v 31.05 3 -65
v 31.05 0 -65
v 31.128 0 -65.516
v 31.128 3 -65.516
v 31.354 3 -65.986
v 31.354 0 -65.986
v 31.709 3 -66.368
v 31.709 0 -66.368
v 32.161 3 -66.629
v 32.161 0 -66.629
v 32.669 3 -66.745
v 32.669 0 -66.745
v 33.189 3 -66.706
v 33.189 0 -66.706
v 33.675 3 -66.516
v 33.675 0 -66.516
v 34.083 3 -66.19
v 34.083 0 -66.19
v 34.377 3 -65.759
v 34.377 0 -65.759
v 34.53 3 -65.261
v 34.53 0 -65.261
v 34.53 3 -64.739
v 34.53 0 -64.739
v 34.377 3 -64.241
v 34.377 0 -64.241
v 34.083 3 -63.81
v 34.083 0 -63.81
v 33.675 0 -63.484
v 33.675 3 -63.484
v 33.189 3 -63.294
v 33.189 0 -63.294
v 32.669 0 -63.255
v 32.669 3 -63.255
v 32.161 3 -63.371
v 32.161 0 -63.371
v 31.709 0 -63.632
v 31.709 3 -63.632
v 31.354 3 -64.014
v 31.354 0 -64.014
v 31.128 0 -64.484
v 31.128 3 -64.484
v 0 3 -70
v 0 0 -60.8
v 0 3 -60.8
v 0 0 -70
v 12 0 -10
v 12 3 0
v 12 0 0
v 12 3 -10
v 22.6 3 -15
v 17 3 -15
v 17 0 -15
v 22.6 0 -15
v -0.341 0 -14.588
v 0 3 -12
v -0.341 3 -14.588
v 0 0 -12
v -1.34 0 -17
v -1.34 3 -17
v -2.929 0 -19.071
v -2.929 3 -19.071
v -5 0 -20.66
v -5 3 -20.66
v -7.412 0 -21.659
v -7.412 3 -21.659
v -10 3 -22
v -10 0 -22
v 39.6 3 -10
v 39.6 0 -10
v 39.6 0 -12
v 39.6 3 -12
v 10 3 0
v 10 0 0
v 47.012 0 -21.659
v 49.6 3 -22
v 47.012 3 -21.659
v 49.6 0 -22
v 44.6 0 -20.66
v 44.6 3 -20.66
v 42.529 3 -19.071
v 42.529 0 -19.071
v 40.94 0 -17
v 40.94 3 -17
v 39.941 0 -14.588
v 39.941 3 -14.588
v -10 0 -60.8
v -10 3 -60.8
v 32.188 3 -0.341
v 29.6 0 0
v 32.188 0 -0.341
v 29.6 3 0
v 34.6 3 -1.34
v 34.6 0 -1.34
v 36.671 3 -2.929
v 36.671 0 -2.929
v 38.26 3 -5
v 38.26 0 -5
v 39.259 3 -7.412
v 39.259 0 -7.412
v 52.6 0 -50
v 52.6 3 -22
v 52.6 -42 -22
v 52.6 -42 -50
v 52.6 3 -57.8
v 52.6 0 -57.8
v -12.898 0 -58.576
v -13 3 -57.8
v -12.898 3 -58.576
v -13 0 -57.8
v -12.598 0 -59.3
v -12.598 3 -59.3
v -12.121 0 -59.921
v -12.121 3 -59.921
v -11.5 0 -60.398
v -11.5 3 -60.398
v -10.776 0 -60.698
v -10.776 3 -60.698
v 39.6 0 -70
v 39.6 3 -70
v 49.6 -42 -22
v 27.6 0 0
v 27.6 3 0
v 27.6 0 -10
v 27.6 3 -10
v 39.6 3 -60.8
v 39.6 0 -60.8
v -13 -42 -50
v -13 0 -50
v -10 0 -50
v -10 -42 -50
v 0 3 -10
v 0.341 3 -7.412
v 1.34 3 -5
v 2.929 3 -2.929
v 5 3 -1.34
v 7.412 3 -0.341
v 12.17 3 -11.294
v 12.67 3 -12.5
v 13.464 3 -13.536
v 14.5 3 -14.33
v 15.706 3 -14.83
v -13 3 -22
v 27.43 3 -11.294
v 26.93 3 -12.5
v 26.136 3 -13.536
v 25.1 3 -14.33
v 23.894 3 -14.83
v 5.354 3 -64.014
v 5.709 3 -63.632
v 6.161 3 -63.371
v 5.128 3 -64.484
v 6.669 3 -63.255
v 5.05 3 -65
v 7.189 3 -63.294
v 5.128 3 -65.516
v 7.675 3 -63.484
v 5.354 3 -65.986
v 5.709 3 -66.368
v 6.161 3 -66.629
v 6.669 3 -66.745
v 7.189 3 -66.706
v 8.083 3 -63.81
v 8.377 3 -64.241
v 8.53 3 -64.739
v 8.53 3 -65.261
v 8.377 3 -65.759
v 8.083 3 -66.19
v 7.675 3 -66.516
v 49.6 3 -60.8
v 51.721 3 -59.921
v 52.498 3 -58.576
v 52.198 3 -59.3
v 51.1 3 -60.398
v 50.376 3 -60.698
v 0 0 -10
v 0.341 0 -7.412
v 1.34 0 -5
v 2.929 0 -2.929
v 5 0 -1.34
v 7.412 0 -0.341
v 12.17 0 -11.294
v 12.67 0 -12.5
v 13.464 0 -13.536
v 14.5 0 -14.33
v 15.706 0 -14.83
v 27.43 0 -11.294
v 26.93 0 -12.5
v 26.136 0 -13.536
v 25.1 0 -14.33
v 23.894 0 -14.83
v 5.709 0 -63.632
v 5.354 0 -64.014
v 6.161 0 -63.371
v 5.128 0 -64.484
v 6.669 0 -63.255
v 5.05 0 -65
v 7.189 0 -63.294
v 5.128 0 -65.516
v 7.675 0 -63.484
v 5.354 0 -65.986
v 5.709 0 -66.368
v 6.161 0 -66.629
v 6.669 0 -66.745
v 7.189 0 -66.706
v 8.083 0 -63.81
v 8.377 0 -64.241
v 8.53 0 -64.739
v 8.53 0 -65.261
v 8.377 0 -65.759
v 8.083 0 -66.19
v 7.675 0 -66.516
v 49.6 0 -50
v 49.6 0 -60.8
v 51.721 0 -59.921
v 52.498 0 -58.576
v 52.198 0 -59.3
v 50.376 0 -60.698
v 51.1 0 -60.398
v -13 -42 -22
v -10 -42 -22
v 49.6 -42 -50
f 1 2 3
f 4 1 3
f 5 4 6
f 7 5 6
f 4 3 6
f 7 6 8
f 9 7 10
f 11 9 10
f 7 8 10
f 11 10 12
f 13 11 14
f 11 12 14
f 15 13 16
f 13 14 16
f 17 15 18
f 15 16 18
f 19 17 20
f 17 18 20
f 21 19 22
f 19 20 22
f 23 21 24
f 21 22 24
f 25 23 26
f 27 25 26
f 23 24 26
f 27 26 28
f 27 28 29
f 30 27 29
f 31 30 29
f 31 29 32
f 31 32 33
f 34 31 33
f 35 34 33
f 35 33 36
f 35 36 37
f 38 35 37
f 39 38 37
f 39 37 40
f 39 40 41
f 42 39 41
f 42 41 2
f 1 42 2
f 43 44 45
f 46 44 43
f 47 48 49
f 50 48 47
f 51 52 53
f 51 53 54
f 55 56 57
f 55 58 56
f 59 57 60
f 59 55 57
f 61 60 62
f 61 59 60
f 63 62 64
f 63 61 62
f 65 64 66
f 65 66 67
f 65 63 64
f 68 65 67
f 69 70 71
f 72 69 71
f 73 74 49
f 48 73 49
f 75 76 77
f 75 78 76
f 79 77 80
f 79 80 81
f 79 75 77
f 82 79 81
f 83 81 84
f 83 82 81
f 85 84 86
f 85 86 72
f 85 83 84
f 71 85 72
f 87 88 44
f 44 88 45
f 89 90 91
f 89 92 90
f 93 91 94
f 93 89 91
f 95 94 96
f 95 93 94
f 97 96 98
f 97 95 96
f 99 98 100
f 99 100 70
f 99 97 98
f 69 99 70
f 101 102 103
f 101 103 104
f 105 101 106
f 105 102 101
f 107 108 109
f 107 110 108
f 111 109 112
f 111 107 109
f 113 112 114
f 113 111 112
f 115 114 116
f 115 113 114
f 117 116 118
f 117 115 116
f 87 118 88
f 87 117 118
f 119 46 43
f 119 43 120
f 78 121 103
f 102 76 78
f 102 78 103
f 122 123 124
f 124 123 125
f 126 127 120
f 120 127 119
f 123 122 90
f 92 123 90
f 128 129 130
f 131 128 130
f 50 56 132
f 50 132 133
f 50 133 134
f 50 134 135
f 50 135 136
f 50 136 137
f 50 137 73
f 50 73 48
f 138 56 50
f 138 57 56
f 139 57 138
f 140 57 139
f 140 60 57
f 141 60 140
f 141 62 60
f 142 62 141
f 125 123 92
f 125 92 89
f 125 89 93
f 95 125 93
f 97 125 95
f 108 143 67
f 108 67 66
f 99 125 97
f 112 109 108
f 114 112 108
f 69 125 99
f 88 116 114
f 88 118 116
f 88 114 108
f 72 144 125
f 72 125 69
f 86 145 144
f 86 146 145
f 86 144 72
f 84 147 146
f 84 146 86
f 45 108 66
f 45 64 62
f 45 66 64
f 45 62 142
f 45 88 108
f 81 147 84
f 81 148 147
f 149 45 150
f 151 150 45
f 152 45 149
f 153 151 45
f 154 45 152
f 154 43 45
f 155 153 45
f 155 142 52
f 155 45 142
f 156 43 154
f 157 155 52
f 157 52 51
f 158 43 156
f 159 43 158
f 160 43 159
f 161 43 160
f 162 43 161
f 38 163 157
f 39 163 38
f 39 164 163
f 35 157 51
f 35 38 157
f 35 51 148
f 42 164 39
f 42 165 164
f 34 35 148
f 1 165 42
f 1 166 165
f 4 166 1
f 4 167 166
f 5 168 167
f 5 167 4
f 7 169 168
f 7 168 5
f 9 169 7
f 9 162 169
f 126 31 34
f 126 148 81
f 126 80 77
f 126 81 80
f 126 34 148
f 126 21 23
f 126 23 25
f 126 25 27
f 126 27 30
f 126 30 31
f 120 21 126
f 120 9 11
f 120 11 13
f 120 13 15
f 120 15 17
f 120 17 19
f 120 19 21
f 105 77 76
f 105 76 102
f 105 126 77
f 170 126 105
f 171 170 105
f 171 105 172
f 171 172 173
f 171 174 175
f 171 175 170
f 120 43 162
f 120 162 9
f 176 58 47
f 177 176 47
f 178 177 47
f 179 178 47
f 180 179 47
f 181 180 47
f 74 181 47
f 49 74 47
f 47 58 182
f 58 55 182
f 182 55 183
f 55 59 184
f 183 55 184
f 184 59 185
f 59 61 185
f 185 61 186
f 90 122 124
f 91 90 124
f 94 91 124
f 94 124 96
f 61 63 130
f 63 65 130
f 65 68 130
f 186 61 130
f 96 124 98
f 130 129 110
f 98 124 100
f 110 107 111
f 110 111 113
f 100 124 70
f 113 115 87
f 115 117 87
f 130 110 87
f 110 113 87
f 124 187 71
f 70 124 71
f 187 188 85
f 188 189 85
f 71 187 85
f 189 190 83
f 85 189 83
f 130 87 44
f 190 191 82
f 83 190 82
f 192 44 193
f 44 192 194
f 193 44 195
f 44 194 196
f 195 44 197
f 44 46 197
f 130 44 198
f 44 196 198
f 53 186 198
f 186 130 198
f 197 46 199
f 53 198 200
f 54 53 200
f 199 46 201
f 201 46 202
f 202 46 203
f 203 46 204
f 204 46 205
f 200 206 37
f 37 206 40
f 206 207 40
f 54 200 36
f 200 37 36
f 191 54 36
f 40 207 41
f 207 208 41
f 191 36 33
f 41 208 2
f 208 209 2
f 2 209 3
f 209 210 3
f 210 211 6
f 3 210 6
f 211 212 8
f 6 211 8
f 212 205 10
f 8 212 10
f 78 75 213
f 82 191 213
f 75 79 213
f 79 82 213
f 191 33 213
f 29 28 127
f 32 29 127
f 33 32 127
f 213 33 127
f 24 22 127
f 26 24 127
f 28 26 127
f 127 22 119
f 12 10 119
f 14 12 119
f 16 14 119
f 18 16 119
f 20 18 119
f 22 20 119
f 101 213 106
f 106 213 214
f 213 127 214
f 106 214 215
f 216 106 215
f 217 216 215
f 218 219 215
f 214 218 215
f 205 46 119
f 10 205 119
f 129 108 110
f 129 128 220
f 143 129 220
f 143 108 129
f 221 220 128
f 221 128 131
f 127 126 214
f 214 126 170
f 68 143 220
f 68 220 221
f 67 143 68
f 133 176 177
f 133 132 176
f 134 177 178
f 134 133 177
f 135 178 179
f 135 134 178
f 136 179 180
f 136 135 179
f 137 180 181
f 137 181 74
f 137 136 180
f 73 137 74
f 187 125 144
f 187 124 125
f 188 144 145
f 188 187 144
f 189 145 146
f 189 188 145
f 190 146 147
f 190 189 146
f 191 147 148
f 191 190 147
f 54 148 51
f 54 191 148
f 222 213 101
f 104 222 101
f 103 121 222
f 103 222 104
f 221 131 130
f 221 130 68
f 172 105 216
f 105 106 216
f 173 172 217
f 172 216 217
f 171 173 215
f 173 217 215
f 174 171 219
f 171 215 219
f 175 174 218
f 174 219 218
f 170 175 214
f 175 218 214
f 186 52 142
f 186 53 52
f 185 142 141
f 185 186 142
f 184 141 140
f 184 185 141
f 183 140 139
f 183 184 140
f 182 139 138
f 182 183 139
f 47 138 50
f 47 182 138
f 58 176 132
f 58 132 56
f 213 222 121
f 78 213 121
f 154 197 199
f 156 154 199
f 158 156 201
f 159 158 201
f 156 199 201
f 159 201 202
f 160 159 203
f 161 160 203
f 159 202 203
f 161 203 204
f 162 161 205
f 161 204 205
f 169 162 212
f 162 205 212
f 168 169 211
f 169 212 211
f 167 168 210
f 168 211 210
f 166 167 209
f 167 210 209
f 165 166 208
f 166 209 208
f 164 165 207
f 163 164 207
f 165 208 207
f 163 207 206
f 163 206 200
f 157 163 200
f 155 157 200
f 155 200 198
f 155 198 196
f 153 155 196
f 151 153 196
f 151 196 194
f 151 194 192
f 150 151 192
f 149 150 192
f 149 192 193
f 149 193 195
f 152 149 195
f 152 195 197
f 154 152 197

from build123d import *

# Parameters (mm, degrees)
SKETCH_1_W          = 39.6
SKETCH_1_H          = 70
EXTRUDE_1_DEPTH     = 3
HOLE_WIZARD_1_D     = 3.5
SKETCH_5_W          = 13
SKETCH_5_H          = 28
EXTRUDE_2_DEPTH     = 3
SKETCH_6_W          = 3
SKETCH_6_H          = 28
EXTRUDE_3_DEPTH     = 42
FILLET_1_R          = 10
FILLET_2_R          = 10
SKETCH_7_W          = 13
SKETCH_7_H          = 10.8
EXTRUDE_4_DEPTH     = 3
FILLET_4_R          = 3
SKETCH_8_W          = 15.6
SKETCH_8_H          = 15
CUT_EXTRUDE_1_DEPTH = 99.446736868
FILLET_5_R          = 5


with BuildPart() as part:
    # 草图1 → 凸台-拉伸1 (new body)
    with BuildSketch(Plane(origin=(0, 0, 0), x_dir=(1, 0, 0), z_dir=(0, 1, 0))):
        with Locations((19.8, 35)):
            Rectangle(SKETCH_1_W, SKETCH_1_H)
    extrude(amount=EXTRUDE_1_DEPTH)

    # 孔1 (through all)
    with Locations(Plane(origin=(0, 3, 0), x_dir=(1, 0, 0), z_dir=(0, 1, 0))):
        with Locations((6.8, 65), (32.8, 65)):
            Hole(HOLE_WIZARD_1_D / 2)

    # 草图5 → 凸台-拉伸2 (add)
    with BuildSketch(Plane(origin=(0, 3, 0), x_dir=(1, 0, 0), z_dir=(0, 1, 0))):
        with Locations((46.1, 36)):
            Rectangle(SKETCH_5_W, SKETCH_5_H)
        with Locations((-6.5, 36)):
            Rectangle(SKETCH_5_W, SKETCH_5_H)
    extrude(amount=-EXTRUDE_2_DEPTH)

    # 草图6 → 凸台-拉伸3 (add)
    with BuildSketch(Plane.XZ):
        with Locations((-11.5, -36)):
            Rectangle(SKETCH_6_W, SKETCH_6_H)
        with Locations((51.1, -36)):
            Rectangle(SKETCH_6_W, SKETCH_6_H)
    extrude(amount=EXTRUDE_3_DEPTH)

    # 圆角1
    fillet_1_edges = [part.edges().sort_by_distance(p)[0] for p in [
        (39.6, 1.5, -22),
        (0, 1.5, -22),
    ]]
    fillet(fillet_1_edges, radius=FILLET_1_R)

    # 圆角2
    fillet_2_edges = [part.edges().sort_by_distance(p)[0] for p in [
        (39.6, 1.5, 0),
        (0, 1.5, 0),
    ]]
    fillet(fillet_2_edges, radius=FILLET_2_R)

    # 草图7 → 凸台-拉伸4 (add)
    with BuildSketch(Plane(origin=(0, 3, 0), x_dir=(1, 0, 0), z_dir=(0, 1, 0))):
        with Locations((46.1, 55.4)):
            Rectangle(SKETCH_7_W, SKETCH_7_H)
        with Locations((-6.5, 55.4)):
            Rectangle(SKETCH_7_W, SKETCH_7_H)
    extrude(amount=-EXTRUDE_4_DEPTH)

    # 圆角4
    fillet_4_edges = [part.edges().sort_by_distance(p)[0] for p in [
        (52.6, 1.5, -60.8),
        (-13, 1.5, -60.8),
    ]]
    fillet(fillet_4_edges, radius=FILLET_4_R)

    # 草图8 → 切除-拉伸1 (cut, through all)
    with BuildSketch(Plane(origin=(0, 3, 0), x_dir=(1, 0, 0), z_dir=(0, 1, 0))):
        with Locations((19.8, 7.5)):
            Rectangle(SKETCH_8_W, SKETCH_8_H)
    extrude(amount=-CUT_EXTRUDE_1_DEPTH, mode=Mode.SUBTRACT)

    # 圆角5
    fillet_5_edges = [part.edges().sort_by_distance(p)[0] for p in [
        (12, 1.5, -15),
        (27.6, 1.5, -15),
    ]]
    fillet(fillet_5_edges, radius=FILLET_5_R)


solid = part.part
